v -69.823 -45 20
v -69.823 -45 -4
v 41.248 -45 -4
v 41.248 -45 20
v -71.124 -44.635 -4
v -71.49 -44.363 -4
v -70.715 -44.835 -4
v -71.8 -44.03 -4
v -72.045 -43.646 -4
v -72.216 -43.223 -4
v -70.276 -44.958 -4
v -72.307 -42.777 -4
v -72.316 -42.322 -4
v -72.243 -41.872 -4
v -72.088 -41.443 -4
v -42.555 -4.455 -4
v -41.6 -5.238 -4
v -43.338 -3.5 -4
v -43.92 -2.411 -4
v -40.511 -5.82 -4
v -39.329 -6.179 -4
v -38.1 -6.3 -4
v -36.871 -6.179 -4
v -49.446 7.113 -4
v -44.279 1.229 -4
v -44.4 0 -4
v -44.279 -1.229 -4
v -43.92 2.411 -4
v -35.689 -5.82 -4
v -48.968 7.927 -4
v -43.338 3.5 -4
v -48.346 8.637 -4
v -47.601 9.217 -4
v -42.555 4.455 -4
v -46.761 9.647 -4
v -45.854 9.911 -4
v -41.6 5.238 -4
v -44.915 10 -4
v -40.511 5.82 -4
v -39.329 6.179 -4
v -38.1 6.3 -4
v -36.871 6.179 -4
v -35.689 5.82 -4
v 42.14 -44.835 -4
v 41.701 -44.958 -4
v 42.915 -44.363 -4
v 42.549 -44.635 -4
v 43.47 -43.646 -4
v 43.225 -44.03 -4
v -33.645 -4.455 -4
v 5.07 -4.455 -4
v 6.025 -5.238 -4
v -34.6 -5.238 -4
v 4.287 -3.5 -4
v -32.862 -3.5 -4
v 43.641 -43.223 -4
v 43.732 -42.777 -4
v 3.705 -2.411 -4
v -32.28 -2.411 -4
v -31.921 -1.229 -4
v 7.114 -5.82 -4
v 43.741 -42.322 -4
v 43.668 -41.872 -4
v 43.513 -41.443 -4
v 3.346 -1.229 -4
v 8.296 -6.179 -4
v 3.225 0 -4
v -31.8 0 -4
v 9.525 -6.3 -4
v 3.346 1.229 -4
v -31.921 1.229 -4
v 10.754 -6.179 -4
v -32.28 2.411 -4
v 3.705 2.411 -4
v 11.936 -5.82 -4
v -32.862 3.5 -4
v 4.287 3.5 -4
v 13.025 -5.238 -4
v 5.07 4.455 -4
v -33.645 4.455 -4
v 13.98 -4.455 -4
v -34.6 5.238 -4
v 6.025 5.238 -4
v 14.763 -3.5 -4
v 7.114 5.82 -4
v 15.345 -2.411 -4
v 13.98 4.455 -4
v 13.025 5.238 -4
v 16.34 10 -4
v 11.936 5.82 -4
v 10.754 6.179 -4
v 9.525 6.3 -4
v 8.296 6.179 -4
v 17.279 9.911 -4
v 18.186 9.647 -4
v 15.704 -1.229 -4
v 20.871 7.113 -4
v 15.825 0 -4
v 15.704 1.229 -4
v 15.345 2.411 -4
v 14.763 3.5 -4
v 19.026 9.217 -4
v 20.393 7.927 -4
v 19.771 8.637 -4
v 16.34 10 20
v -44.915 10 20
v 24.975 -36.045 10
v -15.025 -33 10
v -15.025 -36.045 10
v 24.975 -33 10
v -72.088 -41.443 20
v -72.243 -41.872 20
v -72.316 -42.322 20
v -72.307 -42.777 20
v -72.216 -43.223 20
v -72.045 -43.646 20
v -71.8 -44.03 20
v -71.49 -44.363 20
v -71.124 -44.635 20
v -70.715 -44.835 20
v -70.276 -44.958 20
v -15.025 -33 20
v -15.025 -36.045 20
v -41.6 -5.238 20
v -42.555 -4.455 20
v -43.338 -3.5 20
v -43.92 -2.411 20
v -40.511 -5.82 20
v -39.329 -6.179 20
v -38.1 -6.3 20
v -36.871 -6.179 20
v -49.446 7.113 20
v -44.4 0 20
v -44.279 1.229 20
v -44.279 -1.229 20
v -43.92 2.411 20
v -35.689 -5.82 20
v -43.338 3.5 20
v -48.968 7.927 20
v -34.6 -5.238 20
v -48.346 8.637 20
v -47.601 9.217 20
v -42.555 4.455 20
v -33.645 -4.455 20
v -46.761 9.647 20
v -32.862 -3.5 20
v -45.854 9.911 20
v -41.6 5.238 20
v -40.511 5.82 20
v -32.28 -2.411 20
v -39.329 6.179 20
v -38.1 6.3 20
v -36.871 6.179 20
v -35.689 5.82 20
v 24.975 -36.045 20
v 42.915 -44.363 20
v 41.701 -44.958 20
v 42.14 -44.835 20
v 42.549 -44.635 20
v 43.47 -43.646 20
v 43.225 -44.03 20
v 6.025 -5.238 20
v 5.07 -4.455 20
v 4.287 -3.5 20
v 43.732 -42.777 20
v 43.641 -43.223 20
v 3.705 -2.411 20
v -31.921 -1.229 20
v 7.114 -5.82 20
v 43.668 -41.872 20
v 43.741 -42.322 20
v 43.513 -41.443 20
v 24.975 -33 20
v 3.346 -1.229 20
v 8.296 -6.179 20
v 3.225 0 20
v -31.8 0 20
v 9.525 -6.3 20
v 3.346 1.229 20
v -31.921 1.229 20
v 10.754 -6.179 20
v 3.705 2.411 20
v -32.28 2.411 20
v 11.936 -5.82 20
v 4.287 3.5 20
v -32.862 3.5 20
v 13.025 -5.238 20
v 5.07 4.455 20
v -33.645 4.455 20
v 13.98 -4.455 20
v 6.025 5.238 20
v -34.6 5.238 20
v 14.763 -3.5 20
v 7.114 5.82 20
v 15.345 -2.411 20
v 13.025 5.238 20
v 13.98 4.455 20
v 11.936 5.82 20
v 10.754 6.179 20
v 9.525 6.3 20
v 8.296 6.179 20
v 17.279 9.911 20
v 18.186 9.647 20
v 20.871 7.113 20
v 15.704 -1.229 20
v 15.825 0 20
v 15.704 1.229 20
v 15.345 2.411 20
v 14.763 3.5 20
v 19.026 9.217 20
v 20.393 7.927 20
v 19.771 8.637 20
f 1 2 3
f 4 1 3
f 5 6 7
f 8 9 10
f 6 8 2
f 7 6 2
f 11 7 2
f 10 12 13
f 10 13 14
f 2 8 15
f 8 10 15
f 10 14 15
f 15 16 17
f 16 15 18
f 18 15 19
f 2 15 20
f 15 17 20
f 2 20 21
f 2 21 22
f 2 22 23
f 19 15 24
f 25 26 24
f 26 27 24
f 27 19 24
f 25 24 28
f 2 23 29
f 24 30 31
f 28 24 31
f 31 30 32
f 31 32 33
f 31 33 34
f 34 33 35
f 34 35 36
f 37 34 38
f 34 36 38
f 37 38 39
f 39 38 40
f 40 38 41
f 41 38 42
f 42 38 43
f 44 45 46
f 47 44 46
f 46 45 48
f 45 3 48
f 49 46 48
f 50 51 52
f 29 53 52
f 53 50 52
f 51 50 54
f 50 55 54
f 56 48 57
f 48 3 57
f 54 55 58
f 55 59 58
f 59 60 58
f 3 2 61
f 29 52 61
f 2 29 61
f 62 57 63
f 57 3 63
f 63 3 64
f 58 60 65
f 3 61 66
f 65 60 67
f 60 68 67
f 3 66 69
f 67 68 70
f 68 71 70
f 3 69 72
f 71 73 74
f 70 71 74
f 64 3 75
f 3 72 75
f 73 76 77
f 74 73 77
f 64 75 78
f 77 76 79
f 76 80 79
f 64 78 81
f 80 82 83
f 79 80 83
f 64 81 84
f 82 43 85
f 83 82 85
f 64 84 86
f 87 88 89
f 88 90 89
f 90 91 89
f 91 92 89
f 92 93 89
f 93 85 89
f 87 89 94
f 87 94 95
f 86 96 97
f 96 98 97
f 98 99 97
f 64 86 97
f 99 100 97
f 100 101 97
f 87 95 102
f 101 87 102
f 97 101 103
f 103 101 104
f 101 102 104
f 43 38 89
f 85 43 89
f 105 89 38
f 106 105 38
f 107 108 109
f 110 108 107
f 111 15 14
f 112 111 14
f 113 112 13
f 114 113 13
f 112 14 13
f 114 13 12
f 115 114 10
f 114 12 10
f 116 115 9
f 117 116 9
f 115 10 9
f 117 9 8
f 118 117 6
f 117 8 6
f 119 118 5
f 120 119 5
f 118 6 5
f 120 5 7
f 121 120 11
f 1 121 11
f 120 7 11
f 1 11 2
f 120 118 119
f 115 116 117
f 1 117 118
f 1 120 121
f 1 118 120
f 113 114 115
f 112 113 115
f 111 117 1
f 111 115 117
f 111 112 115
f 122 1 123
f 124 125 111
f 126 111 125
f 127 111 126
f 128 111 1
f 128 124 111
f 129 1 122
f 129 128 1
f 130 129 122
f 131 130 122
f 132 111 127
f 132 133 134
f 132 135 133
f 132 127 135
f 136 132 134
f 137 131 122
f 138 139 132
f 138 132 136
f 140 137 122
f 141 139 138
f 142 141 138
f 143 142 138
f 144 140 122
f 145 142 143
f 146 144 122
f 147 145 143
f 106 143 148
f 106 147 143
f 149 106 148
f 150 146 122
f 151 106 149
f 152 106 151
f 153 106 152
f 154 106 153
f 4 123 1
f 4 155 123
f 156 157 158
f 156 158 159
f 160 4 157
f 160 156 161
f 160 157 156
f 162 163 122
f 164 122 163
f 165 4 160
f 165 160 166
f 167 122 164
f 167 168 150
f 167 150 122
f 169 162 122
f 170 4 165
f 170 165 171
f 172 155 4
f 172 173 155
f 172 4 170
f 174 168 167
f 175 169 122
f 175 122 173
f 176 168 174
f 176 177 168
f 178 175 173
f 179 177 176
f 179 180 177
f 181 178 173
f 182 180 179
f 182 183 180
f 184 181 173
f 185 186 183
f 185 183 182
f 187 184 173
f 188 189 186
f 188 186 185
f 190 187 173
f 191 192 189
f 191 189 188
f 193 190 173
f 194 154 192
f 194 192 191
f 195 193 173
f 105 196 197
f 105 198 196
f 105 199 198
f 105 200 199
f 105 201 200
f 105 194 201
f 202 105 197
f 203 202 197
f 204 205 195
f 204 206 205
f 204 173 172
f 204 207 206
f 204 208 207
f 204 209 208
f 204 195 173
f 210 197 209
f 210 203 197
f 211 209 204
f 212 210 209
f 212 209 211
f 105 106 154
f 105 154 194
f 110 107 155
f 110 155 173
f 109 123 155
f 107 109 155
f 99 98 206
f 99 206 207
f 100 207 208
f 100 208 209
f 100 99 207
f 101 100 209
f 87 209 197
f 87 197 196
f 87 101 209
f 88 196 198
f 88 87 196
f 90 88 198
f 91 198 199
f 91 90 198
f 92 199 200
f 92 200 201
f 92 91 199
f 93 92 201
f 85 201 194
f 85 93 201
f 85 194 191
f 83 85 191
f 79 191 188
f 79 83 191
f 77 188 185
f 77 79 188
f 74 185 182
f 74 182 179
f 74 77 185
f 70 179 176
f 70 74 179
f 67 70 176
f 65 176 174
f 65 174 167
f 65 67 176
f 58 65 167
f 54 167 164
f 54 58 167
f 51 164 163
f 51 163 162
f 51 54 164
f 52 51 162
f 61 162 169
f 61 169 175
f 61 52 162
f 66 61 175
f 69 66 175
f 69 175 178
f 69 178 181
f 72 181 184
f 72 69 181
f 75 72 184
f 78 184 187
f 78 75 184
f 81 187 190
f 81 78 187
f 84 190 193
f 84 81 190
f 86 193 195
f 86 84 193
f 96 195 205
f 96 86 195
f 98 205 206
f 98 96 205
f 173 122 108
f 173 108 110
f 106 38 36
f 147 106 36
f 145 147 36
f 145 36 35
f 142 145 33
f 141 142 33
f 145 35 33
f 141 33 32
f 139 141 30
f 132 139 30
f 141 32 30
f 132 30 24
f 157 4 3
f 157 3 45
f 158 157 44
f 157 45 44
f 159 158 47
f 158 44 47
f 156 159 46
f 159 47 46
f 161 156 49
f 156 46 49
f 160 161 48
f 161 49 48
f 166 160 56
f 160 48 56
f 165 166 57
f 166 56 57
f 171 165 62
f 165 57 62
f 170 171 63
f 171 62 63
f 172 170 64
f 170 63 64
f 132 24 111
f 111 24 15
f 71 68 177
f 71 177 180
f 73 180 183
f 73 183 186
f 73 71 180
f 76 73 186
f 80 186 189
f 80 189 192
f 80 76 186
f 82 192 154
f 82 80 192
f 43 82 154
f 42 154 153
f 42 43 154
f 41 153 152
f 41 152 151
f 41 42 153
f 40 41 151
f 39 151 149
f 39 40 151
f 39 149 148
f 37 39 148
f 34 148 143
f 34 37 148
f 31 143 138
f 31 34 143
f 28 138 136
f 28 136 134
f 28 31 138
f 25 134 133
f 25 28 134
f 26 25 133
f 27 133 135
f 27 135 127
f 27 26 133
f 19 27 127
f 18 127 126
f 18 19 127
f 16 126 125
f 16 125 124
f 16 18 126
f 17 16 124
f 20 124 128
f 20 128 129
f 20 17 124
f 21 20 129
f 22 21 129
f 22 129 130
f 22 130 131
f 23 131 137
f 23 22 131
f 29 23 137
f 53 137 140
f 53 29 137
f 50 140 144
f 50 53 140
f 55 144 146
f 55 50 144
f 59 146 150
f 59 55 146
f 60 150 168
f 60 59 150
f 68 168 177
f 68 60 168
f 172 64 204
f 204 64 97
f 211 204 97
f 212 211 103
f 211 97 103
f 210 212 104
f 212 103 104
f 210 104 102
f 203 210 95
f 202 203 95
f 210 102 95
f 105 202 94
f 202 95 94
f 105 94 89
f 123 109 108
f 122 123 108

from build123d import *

# Parameters (mm, degrees)
BOSS_EXTRUDE1_DEPTH      = 20
BOSS_EXTRUDE1_DEPTH_BACK = 4
SKETCH1_R                = 6.3
SKETCH2_W                = 40
SKETCH2_H                = 3.045079522
CUT_EXTRUDE1_DEPTH       = 10


with BuildPart() as part:
    # Sketch1 → Boss-Extrude1 (new, two sides: drawn at the far end of the back side and taken through both)
    with BuildSketch(Plane.XY.offset(-BOSS_EXTRUDE1_DEPTH_BACK)):
        with BuildLine():
            ThreePointArc((-44.914648696, 10), (-47.601146738, 9.216957229), (-49.446187631, 7.113091309))
            Line((-49.446187631, 7.113091309), (-72.088476723, -41.443454346))
            ThreePointArc((-72.088476723, -41.443454346), (-71.93118587, -43.843249021), (-69.822707256, -45))
            Line((-69.822707256, -45), (41.247707256, -45))
            ThreePointArc((41.247707256, -45), (43.35618587, -43.843249021), (43.513476723, -41.443454346))
            Line((43.513476723, -41.443454346), (20.871187631, 7.113091309))
            ThreePointArc((20.871187631, 7.113091309), (19.026146738, 9.216957229), (16.339648696, 10))
            Line((16.339648696, 10), (-44.914648696, 10))
        make_face()
        with Locations((9.525, 0)):
            Circle(SKETCH1_R, mode=Mode.SUBTRACT)
        with Locations((-38.1, 0)):
            Circle(SKETCH1_R, mode=Mode.SUBTRACT)
    extrude(amount=BOSS_EXTRUDE1_DEPTH + BOSS_EXTRUDE1_DEPTH_BACK)

    # Sketch2 → Cut-Extrude1 (cut)
    with BuildSketch(Plane.XY.offset(20)):
        with Locations((4.975032248, -34.522539761)):
            Rectangle(SKETCH2_W, SKETCH2_H)
    extrude(amount=-CUT_EXTRUDE1_DEPTH, mode=Mode.SUBTRACT)


solid = part.part
